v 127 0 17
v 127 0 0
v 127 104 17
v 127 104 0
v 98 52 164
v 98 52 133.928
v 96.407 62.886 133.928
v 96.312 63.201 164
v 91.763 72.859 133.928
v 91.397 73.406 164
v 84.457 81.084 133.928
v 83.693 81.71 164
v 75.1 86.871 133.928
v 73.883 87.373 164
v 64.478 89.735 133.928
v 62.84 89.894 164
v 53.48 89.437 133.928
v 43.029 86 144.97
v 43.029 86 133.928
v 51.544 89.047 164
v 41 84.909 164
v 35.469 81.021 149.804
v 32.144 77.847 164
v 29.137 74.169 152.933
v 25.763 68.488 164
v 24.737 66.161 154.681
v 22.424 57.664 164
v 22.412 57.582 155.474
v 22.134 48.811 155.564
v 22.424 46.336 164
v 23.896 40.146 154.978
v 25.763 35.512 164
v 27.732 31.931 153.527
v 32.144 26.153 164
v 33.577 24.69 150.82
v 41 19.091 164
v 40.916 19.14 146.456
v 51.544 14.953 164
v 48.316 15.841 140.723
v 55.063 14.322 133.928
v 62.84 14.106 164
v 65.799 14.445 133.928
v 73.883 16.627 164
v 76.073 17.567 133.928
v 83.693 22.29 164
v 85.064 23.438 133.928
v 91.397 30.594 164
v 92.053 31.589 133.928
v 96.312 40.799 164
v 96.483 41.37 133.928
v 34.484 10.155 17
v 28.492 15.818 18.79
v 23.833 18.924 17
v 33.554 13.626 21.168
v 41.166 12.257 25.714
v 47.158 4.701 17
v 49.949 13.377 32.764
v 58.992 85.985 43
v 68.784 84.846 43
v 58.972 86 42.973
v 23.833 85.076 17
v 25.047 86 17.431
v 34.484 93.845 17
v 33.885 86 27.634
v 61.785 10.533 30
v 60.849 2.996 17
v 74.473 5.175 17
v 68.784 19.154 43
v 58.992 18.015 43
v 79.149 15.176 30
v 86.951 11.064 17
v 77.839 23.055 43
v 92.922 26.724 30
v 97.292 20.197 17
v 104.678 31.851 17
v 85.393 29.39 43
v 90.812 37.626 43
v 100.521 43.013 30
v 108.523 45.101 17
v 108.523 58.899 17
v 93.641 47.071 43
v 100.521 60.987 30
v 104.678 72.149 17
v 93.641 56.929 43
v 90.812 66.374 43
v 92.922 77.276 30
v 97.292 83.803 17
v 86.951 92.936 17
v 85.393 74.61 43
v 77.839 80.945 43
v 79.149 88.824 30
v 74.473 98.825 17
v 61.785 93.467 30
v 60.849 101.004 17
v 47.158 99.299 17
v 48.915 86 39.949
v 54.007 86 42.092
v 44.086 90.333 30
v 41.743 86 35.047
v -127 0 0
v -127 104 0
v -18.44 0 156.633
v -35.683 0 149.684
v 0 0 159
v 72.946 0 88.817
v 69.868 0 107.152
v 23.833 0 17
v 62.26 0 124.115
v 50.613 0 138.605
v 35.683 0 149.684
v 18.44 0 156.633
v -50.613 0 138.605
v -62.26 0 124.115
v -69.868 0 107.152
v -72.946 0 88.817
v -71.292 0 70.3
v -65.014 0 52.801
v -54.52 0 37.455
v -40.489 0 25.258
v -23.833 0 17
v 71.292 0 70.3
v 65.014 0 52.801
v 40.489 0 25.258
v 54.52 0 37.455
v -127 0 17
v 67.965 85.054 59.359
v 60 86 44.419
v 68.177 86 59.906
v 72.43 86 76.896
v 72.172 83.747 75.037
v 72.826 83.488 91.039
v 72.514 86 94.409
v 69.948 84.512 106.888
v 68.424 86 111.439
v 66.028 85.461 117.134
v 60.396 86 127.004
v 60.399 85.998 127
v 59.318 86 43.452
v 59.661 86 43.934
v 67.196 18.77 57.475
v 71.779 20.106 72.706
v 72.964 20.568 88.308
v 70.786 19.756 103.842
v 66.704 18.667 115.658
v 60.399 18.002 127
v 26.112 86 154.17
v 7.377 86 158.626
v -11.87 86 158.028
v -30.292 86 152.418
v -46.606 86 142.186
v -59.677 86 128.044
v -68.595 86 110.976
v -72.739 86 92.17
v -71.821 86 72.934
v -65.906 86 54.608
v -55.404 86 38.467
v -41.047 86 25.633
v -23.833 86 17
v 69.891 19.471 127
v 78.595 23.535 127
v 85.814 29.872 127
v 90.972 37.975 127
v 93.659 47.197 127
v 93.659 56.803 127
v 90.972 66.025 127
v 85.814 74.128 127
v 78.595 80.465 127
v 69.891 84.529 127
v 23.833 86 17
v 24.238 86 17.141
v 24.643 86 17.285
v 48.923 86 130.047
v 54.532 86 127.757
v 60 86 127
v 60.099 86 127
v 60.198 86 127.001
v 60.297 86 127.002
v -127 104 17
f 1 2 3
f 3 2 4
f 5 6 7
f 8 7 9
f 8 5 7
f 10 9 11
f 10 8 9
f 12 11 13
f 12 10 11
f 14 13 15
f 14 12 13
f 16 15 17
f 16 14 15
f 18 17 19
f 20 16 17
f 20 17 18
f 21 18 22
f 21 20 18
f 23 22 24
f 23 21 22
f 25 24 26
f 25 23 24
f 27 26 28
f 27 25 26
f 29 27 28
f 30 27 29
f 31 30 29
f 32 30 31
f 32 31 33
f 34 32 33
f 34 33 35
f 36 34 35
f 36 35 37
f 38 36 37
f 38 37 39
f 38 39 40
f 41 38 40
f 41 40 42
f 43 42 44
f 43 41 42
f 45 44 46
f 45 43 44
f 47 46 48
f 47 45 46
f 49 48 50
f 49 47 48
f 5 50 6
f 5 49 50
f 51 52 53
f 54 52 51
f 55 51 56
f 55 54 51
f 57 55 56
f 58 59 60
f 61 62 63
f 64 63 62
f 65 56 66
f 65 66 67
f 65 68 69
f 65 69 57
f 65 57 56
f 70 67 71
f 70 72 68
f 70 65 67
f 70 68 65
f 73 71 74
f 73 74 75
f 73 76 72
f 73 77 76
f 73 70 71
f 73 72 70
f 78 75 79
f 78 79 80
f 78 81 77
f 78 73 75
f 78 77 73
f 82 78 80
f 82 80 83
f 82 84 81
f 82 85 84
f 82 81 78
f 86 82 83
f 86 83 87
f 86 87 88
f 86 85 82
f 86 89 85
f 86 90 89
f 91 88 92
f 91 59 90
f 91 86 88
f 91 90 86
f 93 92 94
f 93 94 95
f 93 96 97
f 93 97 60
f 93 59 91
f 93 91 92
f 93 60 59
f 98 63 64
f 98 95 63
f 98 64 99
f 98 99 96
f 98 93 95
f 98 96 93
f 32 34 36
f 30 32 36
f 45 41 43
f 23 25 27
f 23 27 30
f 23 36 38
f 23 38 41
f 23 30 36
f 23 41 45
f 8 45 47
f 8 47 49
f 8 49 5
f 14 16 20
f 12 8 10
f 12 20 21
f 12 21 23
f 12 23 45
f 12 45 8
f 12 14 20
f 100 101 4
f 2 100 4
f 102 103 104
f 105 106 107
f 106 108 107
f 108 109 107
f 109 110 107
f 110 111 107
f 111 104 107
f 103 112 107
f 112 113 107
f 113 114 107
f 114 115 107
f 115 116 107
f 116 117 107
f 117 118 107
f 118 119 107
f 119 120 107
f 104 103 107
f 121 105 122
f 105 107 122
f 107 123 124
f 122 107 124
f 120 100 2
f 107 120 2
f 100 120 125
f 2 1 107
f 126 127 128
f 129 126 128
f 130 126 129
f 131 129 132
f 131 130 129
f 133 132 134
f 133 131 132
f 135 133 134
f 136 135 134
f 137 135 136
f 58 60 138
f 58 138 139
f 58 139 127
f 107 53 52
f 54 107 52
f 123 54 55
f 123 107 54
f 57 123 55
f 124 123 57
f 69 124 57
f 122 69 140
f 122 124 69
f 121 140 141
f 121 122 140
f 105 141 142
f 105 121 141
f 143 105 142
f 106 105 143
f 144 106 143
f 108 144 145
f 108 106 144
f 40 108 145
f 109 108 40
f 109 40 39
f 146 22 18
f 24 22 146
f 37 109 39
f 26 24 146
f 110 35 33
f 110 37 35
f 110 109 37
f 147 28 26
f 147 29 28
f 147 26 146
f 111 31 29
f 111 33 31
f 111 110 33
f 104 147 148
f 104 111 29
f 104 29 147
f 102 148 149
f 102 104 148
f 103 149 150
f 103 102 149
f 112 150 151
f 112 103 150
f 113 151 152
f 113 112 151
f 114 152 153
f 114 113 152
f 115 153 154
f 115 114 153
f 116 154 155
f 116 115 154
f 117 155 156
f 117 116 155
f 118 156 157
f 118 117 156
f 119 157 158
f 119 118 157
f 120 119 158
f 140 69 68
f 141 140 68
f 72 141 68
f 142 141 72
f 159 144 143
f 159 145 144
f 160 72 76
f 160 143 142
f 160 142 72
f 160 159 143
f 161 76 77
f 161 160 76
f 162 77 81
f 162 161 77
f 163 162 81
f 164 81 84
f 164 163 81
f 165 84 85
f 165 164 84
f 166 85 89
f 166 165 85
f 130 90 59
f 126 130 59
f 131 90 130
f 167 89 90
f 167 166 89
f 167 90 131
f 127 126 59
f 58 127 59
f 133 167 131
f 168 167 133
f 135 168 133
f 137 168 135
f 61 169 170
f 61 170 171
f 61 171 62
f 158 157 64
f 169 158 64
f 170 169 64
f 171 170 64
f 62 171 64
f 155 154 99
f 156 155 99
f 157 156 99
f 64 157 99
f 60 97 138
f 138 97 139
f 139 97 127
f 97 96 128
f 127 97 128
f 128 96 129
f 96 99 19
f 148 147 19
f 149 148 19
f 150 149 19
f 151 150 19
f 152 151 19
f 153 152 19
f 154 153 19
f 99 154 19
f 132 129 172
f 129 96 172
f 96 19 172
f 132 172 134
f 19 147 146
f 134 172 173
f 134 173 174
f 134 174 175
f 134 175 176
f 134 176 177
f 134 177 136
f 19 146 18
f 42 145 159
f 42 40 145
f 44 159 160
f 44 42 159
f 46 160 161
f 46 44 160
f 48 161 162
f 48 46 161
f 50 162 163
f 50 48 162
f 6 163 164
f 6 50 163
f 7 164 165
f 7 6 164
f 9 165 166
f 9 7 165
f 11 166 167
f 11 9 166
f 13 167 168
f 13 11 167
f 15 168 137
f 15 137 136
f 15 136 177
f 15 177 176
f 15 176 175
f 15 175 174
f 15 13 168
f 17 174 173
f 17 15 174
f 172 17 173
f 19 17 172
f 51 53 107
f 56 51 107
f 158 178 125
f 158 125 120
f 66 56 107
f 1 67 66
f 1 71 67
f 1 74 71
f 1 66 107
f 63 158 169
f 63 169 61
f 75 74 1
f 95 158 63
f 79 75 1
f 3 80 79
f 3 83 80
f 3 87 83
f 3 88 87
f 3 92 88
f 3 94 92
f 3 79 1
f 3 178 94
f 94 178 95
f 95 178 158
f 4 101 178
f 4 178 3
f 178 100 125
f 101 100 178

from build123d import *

# Parameters (mm, degrees)
F0_R     = 73
F1_DEPTH = 86
F5_W     = 254
F5_H     = 104
F6_DEPTH = 17


with BuildPart() as f1:
    # F0 (on Front) → F1 (new body)
    with BuildSketch(Plane.XZ):
        with Locations((0, 86)):
            Circle(F0_R)
    extrude(amount=-F1_DEPTH)

    # F3 (on offset) → F4 (revolve)
    with BuildSketch(Plane.XZ.offset(-52)):
        Polygon((98, 164), (60, 164), (60, 17), (109.011107, 17), (94, 43), (94, 127), (98, 133.928203), align=None)
    revolve(axis=Axis((60, 52, 90.5), (0, 0, 1)))

    # F5 (on Top) → F6 (join)
    with BuildSketch(Plane.XY):
        with Locations((0, 52)):
            Rectangle(F5_W, F5_H)
    extrude(amount=F6_DEPTH)


solid = f1.part
